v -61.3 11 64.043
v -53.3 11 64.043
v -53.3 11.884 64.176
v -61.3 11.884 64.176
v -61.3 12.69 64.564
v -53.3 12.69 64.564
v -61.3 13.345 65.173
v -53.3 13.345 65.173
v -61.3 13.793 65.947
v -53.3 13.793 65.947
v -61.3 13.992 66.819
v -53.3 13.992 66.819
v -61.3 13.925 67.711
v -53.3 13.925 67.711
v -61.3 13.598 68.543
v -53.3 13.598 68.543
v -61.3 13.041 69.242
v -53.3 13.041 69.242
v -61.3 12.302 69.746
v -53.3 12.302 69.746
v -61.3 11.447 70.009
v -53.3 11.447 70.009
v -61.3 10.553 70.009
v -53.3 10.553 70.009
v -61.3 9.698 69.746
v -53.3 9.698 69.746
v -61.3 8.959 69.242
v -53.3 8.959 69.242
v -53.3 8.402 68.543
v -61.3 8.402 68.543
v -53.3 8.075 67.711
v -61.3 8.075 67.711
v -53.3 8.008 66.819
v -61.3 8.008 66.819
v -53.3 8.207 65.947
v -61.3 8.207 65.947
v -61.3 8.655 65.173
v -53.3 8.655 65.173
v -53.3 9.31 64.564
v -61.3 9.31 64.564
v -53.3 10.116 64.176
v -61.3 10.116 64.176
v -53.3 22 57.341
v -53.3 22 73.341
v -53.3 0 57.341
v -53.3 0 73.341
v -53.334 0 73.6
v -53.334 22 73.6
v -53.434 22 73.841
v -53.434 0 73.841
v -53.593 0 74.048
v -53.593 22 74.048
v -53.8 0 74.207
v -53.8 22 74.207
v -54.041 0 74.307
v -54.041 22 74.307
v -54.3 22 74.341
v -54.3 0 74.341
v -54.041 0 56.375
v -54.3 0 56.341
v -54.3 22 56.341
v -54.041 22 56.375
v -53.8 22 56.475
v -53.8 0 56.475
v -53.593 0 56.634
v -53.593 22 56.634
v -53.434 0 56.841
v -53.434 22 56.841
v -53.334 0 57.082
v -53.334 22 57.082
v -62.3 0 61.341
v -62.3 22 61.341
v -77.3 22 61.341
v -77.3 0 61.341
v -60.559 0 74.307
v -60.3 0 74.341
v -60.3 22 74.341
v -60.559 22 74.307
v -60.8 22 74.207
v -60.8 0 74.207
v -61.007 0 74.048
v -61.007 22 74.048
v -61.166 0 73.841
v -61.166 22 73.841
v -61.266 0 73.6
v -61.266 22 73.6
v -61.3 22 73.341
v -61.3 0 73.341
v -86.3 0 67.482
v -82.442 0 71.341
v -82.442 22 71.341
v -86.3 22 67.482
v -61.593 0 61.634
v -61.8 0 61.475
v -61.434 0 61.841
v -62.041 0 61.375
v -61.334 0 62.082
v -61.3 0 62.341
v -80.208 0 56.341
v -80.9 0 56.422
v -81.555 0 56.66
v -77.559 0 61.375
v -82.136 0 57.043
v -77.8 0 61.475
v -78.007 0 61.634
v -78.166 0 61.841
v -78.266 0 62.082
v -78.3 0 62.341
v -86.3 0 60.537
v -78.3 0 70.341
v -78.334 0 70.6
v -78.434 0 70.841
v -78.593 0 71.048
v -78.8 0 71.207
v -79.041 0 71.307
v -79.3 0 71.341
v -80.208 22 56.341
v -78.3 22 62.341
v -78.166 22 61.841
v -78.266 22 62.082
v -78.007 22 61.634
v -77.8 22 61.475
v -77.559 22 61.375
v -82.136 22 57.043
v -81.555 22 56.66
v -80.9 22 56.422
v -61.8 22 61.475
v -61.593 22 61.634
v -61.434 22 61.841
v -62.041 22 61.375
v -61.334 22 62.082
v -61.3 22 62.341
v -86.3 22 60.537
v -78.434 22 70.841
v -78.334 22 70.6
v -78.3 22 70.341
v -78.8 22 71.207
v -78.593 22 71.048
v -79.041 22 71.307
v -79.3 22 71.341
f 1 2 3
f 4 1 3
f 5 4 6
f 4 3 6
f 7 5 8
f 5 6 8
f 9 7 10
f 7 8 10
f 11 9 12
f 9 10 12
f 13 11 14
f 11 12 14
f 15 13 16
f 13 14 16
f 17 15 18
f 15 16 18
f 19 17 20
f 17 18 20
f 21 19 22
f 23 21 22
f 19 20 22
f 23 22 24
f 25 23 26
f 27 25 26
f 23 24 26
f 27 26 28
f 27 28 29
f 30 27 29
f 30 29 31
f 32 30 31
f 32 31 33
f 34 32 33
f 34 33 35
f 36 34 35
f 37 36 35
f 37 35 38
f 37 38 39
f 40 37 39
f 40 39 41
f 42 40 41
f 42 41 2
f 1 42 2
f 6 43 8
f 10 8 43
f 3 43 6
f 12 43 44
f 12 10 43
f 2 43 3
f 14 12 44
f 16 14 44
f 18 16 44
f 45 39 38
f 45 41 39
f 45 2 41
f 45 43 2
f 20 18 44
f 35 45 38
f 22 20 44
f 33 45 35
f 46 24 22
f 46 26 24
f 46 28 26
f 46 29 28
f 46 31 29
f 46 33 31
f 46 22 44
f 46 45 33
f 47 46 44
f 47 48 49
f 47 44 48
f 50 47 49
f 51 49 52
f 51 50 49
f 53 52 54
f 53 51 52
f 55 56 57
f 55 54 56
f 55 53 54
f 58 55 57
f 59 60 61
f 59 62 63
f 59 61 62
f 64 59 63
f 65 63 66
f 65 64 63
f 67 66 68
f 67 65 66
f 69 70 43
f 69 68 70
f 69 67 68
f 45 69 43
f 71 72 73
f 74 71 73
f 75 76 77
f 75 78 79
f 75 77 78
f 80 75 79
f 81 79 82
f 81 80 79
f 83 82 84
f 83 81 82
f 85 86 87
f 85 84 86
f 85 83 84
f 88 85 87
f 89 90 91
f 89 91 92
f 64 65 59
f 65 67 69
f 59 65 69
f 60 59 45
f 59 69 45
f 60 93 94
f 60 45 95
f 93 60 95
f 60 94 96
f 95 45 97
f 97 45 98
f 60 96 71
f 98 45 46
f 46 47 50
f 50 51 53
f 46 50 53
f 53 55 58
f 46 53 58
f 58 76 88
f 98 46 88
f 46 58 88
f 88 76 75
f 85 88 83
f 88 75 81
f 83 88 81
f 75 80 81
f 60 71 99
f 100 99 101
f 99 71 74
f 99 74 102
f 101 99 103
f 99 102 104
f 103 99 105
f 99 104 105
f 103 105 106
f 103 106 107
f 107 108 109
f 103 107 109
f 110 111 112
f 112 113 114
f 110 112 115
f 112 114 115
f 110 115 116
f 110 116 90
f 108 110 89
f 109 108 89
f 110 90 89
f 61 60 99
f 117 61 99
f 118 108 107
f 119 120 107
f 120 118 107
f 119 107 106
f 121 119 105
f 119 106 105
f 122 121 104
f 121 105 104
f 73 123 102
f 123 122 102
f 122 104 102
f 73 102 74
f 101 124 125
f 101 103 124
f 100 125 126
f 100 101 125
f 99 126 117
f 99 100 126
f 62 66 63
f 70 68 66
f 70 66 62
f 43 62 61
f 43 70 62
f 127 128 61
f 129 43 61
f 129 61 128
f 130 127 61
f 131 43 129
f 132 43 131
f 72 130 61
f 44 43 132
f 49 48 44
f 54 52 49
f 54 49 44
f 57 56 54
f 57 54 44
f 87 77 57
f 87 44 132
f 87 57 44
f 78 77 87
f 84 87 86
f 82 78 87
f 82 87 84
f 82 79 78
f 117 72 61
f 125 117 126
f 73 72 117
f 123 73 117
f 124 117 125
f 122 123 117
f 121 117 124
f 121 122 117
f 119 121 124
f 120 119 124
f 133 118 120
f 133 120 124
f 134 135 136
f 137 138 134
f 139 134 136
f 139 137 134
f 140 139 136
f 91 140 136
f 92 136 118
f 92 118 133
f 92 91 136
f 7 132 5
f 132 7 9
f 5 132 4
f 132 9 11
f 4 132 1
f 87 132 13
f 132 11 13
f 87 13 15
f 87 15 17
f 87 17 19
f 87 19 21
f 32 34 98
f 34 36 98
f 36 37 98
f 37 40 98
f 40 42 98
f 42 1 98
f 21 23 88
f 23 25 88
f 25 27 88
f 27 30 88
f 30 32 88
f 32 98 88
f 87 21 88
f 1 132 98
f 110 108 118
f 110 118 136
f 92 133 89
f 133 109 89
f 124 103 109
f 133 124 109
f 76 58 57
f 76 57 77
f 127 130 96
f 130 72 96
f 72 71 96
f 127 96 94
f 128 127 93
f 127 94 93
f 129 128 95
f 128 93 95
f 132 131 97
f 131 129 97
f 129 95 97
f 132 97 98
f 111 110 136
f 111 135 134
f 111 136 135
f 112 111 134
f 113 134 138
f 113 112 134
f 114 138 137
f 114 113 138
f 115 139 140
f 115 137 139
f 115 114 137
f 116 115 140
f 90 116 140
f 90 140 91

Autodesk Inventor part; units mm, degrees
ref_plane "YZ Plane" through (0, 0, 0) normal (1, 0, 0) x (0, 1, 0)
ref_plane "XZ Plane" through (0, 0, 0) normal (0, 1, 0) x (-1, 0, 0)
ref_plane "XY Plane" through (0, 0, 0) normal (0, 0, 1) x (1, 0, 0)
sketch "スケッチ1" plane through (0, 0, 0) normal (0, 1, 0) x (-1, 0, 0)
  line L0 (-49.8489, 61.5411) -> (-49.8489, 83.4411)
  line L1 (-49.8489, 83.4411) -> (10.1511, 83.4411)
  line L2 (10.1511, 83.4411) -> (10.1511, 61.5411)
  line L3 (10.1511, 61.5411) -> (-8.8489, 61.5411)
  line L4 (-8.8489, 56.3412) -> (-8.8489, 74.3411)
  line L5 (-8.8489, 74.3411) -> (-15.9758, 74.3411)
  line L6 (-23.7218, 74.3411) -> (-30.8489, 74.3411)
  line L7 (-30.8489, 74.3411) -> (-30.8489, 56.3412)
  line L8 (-30.8489, 56.3411) -> (-8.8489, 56.3411)
  circle A0 centre (-19.8489, 67.3411) radius 8
  circle A1 centre (-19.8489, 67.3411) radius 7.5
  line L9 (-30.8489, 61.5411) -> (-49.8489, 61.5411)
  line L10 (-49.8489, 75.5411) -> (10.1511, 75.5411)
  line L11 (53.2984, 117.706) -> (53.2984, 177.706)
  line L12 (53.2984, 177.706) -> (143.2984, 177.706)
  line L13 (143.2984, 177.706) -> (143.2984, 117.706)
  line L14 (143.2984, 117.706) -> (53.2984, 117.706)
  circle A2 centre (83.9984, 122.706) radius 1.5
  circle A3 centre (83.9984, 147.706) radius 1.5
  circle A4 centre (93.9984, 147.706) radius 2.25
  circle A5 centre (83.9984, 172.706) radius 1.5
  circle A6 centre (108.9984, 172.706) radius 1.5
  circle A7 centre (133.9984, 172.706) radius 1.5
  circle A8 centre (133.9984, 147.706) radius 1.5
  circle A9 centre (123.9984, 147.706) radius 2.25
  circle A10 centre (108.9984, 147.706) radius 7.5
  circle A11 centre (108.9984, 122.706) radius 1.5
  circle A12 centre (133.9984, 122.706) radius 1.5
  line L15 (174.3262, 83.4411) -> (174.3262, 61.5411)
  line L16 (174.3262, 61.5411) -> (193.3262, 61.5411)
  line L17 (193.3262, 65.4411) -> (193.3262, 56.3412)
  line L18 (193.3262, 56.3411) -> (215.3262, 56.3411)
  line L19 (215.3262, 56.3412) -> (215.3262, 65.4411)
  line L20 (215.3262, 61.5411) -> (234.3263, 61.5411)
  line L21 (234.3263, 61.5411) -> (234.3263, 83.4411)
  line L22 (234.3263, 83.4411) -> (174.3262, 83.4411)
  line L23 (234.3263, 65.4411) -> (174.3262, 65.4411)
  line L24 (143.2984, 25.0403) -> (53.2984, 25.0403)
  line L25 (53.2984, 25.0403) -> (53.2984, -34.9597)
  line L26 (53.2984, -34.9597) -> (143.2984, -34.9597)
  line L27 (143.2984, -34.9597) -> (143.2984, 25.0403)
  line L28 (131.5644, 25.0403) -> (131.5644, -34.9597)
  circle A13 centre (108.9984, -29.9597) radius 1.5
  circle A14 centre (108.9984, -4.9597) radius 7.5
  circle A15 centre (123.9984, -4.9597) radius 2.25
  circle A16 centre (123.9984, -4.9597) radius 4
  circle A17 centre (108.9984, 20.0403) radius 1.5
  circle A18 centre (83.9984, 20.0403) radius 1.5
  line L29 (73.2984, 25.0403) -> (73.2984, 6.0403)
  line L30 (86.3001, -15.9597) -> (86.3001, 6.0403)
  line L31 (86.3001, 6.0403) -> (53.3001, 6.0403)
  line L32 (53.3001, 6.0403) -> (53.3001, -15.9597)
  line L33 (53.3001, -15.9597) -> (86.3001, -15.9597)
  line L34 (73.2984, -15.9597) -> (73.2984, -34.9597)
  line L35 (63.2984, -34.9597) -> (63.2984, -15.9597)
  line L36 (63.2984, 6.0403) -> (63.2984, 25.0403)
  circle A19 centre (83.9984, -29.9597) radius 1.5
  circle A20 centre (93.9984, -4.9597) radius 2.25
  circle A21 centre (93.9984, -4.9597) radius 4
  line L37 (-19.8489, 49.2711) -> (-19.8489, 87.2696)
  line L38 (-6.1616, 67.3411) -> (-35.9585, 67.3411)
  line L39 (83.9984, 23.5784) -> (83.9984, 16.5836)
  circle A22 centre (83.9984, 20.0403) radius 2
  line L40 (80.6576, 20.0403) -> (87.5893, 20.0403)
  line L41 (93.9984, 1.0394) -> (93.9984, -10.6526)
  line L42 (83.9984, -26.503) -> (83.9984, -33.4978)
  circle A23 centre (83.9984, -29.9597) radius 2
  line L43 (80.6576, -29.9597) -> (87.5893, -29.9597)
  line L44 (29.8273, -4.9597) -> (148.6488, -4.9597)
  line L45 (123.9984, -10.6526) -> (123.9984, 1.0394)
  line L46 (112.4368, 20.0403) -> (105.6741, 20.0403)
  circle A24 centre (108.9984, 20.0403) radius 2
  line L47 (108.9984, 32.4142) -> (108.9984, -41.5197)
  circle A25 centre (108.9984, -29.9597) radius 2
  line L48 (105.4074, -29.9597) -> (112.8092, -29.9597)
  circle A26 centre (108.9984, -4.9597) radius 8
  line L49 (108.9984, 111.8823) -> (108.9984, 183.8068)
  circle A27 centre (108.9984, 172.706) radius 2
  line L50 (105.6741, 172.706) -> (112.4368, 172.706)
  line L51 (130.4749, 172.706) -> (137.3391, 172.706)
  circle A28 centre (133.9984, 172.706) radius 2
  line L52 (133.9984, 169.2493) -> (133.9984, 176.2441)
  line L53 (123.9984, 153.3988) -> (123.9984, 141.7069)
  circle A29 centre (123.9984, 147.706) radius 4
  circle A30 centre (133.9984, 147.706) radius 2
  line L54 (133.9984, 151.0572) -> (133.9984, 144.2493)
  line L55 (148.6488, 147.706) -> (29.8273, 147.706)
  circle A31 centre (83.9984, 147.706) radius 2
  line L56 (83.9984, 151.0572) -> (83.9984, 144.2493)
  line L57 (93.9984, 141.7069) -> (93.9984, 153.3988)
  circle A32 centre (93.9984, 147.706) radius 4
  line L58 (83.9984, 169.2493) -> (83.9984, 176.2441)
  circle A33 centre (83.9984, 172.706) radius 2
  line L59 (80.6576, 172.706) -> (87.5893, 172.706)
  circle A34 centre (108.9984, 147.706) radius 8
  circle A35 centre (108.9984, 122.706) radius 2
  line L60 (105.4074, 122.706) -> (112.8092, 122.706)
  line L61 (130.8446, 122.706) -> (137.3391, 122.706)
  circle A36 centre (133.9984, 122.706) radius 2
  line L62 (133.9984, 126.1627) -> (133.9984, 119.1679)
  line L63 (87.5893, 122.706) -> (80.6576, 122.706)
  circle A37 centre (83.9984, 122.706) radius 2
  line L64 (83.9984, 126.1627) -> (83.9984, 119.1679)
  line L65 (204.3262, 87.2696) -> (204.3262, 49.2711)
  line L66 (176.3262, 70.0686) -> (232.3263, 70.0686)
  line L67 (82.1365, 4.0403) -> (82.1365, -13.9597)
  line L68 (51.8001, 144.706) -> (51.8001, 150.706)
  line L69 (53.2984, 150.706) -> (51.8001, 150.706)
  line L70 (53.2984, 144.706) -> (51.8001, 144.706)
  line L71 (33.8001, 155.206) -> (33.8001, 140.206)
  line L72 (33.8001, 140.206) -> (34.3001, 139.706)
  line L73 (34.3001, 139.706) -> (51.3001, 139.706)
  line L74 (51.3001, 139.706) -> (51.8001, 140.206)
  line L75 (51.8001, 140.206) -> (51.8001, 155.206)
  line L76 (51.8001, 155.206) -> (51.3001, 155.706)
  line L77 (51.3001, 155.706) -> (34.3001, 155.706)
  line L78 (34.3001, 155.706) -> (33.8001, 155.206)
  line L79 (34.3001, 155.706) -> (34.3001, 139.706)
  line L80 (51.3001, 139.706) -> (51.3001, 155.706)
  line L81 (51.8001, -7.9597) -> (51.8001, -1.9597)
  line L82 (53.3001, -1.9597) -> (51.8001, -1.9597)
  line L83 (53.3001, -7.9597) -> (51.8001, -7.9597)
  line L84 (33.8001, 2.5403) -> (33.8001, -12.4597)
  line L85 (33.8001, -12.4597) -> (34.3001, -12.9597)
  line L86 (34.3001, -12.9597) -> (51.3001, -12.9597)
  line L87 (51.3001, -12.9597) -> (51.8001, -12.4597)
  line L88 (51.8001, -12.4597) -> (51.8001, 2.5403)
  line L89 (51.8001, 2.5403) -> (51.3001, 3.0403)
  line L90 (51.3001, 3.0403) -> (34.3001, 3.0403)
  line L91 (34.3001, 3.0403) -> (33.8001, 2.5403)
  line L92 (34.3001, 3.0403) -> (34.3001, -12.9597)
  line L93 (51.3001, -12.9597) -> (51.3001, 3.0403)
  line L94 (28.0972, 67.3411) -> (83.3407, 67.3411)
  line L95 (82.8984, 75.4411) -> (90.6984, 75.4411)
  line L96 (127.3984, 75.4411) -> (133.1984, 75.4411)
  line L97 (134.7552, 70.5411) -> (131.5724, 67.3583)
  line L98 (82.4415, 71.3411) -> (86.3001, 67.4825)
  line L99 (78.3001, 69.4911) -> (75.8001, 69.4911)
  line L100 (78.3001, 65.1911) -> (75.8001, 65.1911)
  line L101 (75.8001, 64.8411) -> (75.8001, 69.8411)
  line L102 (75.3001, 70.3411) -> (73.1569, 70.3411)
  line L103 (75.3001, 64.3411) -> (73.1569, 64.3411)
  line L104 (75.8001, 69.8411) -> (73.1569, 69.8411)
  line L105 (75.8001, 64.8411) -> (73.1569, 64.8411)
  line L106 (51.8001, 64.3411) -> (51.8001, 70.3411)
  line L107 (53.3001, 70.3411) -> (51.8001, 70.3411)
  line L108 (53.3001, 64.3411) -> (51.8001, 64.3411)
  line L109 (33.8001, 74.8411) -> (33.8001, 59.8411)
  line L110 (33.8001, 59.8411) -> (34.3001, 59.3411)
  line L111 (34.3001, 59.3411) -> (51.3001, 59.3411)
  line L112 (51.3001, 59.3411) -> (51.8001, 59.8411)
  line L113 (51.8001, 59.8411) -> (51.8001, 74.8411)
  line L114 (51.8001, 74.8411) -> (51.3001, 75.3411)
  line L115 (51.3001, 75.3411) -> (34.3001, 75.3411)
  line L116 (34.3001, 75.3411) -> (33.8001, 74.8411)
  line L117 (34.3001, 75.3411) -> (34.3001, 59.3411)
  line L118 (51.3001, 59.3411) -> (51.3001, 75.3411)
  line L119 (54.3001, 74.3411) -> (60.3001, 74.3411)
  line L120 (54.3001, 56.3411) -> (80.2082, 56.3411)
  line L121 (53.3001, 57.3411) -> (53.3001, 73.3411)
  line L122 (86.3001, 60.5366) -> (86.3001, 67.4825)
  line L123 (61.3001, 62.3411) -> (61.3001, 73.3411)
  line L124 (62.3001, 61.3411) -> (77.3001, 61.3411)
  line L125 (78.3001, 62.3411) -> (78.3001, 70.3411)
  line L126 (79.3001, 71.3411) -> (82.4415, 71.3411)
  line L127 (82.1365, 57.0429) -> (86.3001, 60.5366)
  arc A38 (80.2082, 56.3411) -> (82.1365, 57.0429) centre (80.2082, 59.3411) ccw
  arc A39 (54.3001, 74.3411) -> (53.3001, 73.3411) centre (54.3001, 73.3411) ccw
  arc A40 (61.3001, 73.3411) -> (60.3001, 74.3411) centre (60.3001, 73.3411) ccw
  arc A41 (53.3001, 57.3411) -> (54.3001, 56.3411) centre (54.3001, 57.3411) ccw
  arc A42 (61.3001, 62.3411) -> (62.3001, 61.3411) centre (62.3001, 62.3411) ccw
  arc A43 (77.3001, 61.3411) -> (78.3001, 62.3411) centre (77.3001, 62.3411) ccw
  arc A44 (79.3001, 71.3411) -> (78.3001, 70.3411) centre (79.3001, 70.3411) ccw
  line L128 (63.1569, 70.3411) -> (61.3001, 70.3411)
  line L129 (63.1569, 69.8411) -> (61.3001, 69.8411)
  line L130 (63.1569, 64.8411) -> (61.3001, 64.8411)
  line L131 (63.1569, 64.3411) -> (61.3001, 64.3411)
  line L132 (75.3001, 70.3411) -> (75.8001, 69.8411)
  line L133 (75.3001, 64.3411) -> (75.8001, 64.8411)
  arc A45 (63.2984, 63.5411) -> (65.2984, 61.5411) centre (65.2984, 63.5411) ccw
  line L134 (65.2984, 61.5411) -> (71.2984, 61.5411)
  arc A46 (71.2984, 61.5411) -> (73.2984, 63.5411) centre (71.2984, 63.5411) ccw
  line L135 (73.2984, 63.5411) -> (73.2984, 75.0411)
  line L136 (135.2984, 75.8411) -> (135.2984, 70.7411)
  line L137 (143.2984, 72.6666) -> (143.2984, 83.4411)
  line L138 (143.2984, 83.4411) -> (53.2984, 83.4411)
  line L139 (53.2984, 83.4411) -> (53.2984, 76.5411)
  arc A47 (53.2984, 76.5411) -> (54.2984, 75.5411) centre (54.2984, 76.5411) ccw
  line L140 (54.2984, 75.5411) -> (62.2984, 75.5411)
  arc A48 (63.2984, 74.5411) -> (62.2984, 75.5411) centre (62.2984, 74.5411) ccw
  line L141 (63.2984, 74.5411) -> (63.2984, 63.5411)
  line L142 (74.2984, 76.0411) -> (82.2984, 76.0411)
  line L143 (133.7984, 76.0411) -> (133.1984, 75.4411)
  line L144 (127.3984, 75.4411) -> (126.7984, 76.0411)
  line L145 (90.6984, 75.4411) -> (91.2984, 76.0411)
  line L146 (82.8984, 75.4411) -> (82.2984, 76.0411)
  line L147 (91.2984, 76.0411) -> (126.7984, 76.0411)
  arc A49 (74.2984, 76.0411) -> (73.2984, 75.0411) centre (74.2984, 75.0411) ccw
  line L148 (133.7984, 76.0411) -> (135.0984, 76.0411)
  arc A50 (135.2984, 75.8411) -> (135.0984, 76.0411) centre (135.0984, 75.8411) ccw
  line L149 (135.0984, 70.5411) -> (134.7552, 70.5411)
  arc A51 (135.0984, 70.5411) -> (135.2984, 70.7411) centre (135.0984, 70.7411) ccw
  arc A52 (131.5724, 67.3583) -> (134.1894, 65.6755) centre (133.3144, 67.1911) ccw
  line L150 (134.1894, 65.6755) -> (141.7984, 70.0686)
  arc A53 (141.7984, 70.0686) -> (143.2984, 72.6666) centre (140.2984, 72.6666) ccw
  line L151 (124.9984, 127.8911) -> (124.9984, 123.5209)
  line L152 (127.1835, 125.706) -> (122.8133, 125.706)
  circle A54 centre (124.9984, 125.706) radius 1
  circle A55 centre (124.9984, 125.706) radius 1.5
  line L153 (124.9984, 167.5209) -> (124.9984, 171.8911)
  line L154 (127.1835, 169.706) -> (122.8133, 169.706)
  circle A56 centre (124.9984, 169.706) radius 1
  circle A57 centre (124.9984, 169.706) radius 1.5
  line L155 (58.9984, 127.8911) -> (58.9984, 123.5209)
  line L156 (61.1835, 125.706) -> (56.8133, 125.706)
  circle A58 centre (58.9984, 125.706) radius 1
  circle A59 centre (58.9984, 125.706) radius 1.5
  line L157 (58.9984, 167.5209) -> (58.9984, 171.8911)
  line L158 (61.1835, 169.706) -> (56.8133, 169.706)
  circle A60 centre (58.9984, 169.706) radius 1
  circle A61 centre (58.9984, 169.706) radius 1.5
  line L159 (34.3001, 154.706) -> (49.1751, 154.706)
  line L160 (34.3001, 153.706) -> (47.0501, 153.706)
  line L161 (34.3001, 152.706) -> (44.9251, 152.706)
  line L162 (34.3001, 151.706) -> (42.8001, 151.706)
  line L163 (34.3001, 150.706) -> (40.6751, 150.706)
  line L164 (34.3001, 149.706) -> (38.5501, 149.706)
  line L165 (34.3001, 148.706) -> (36.4251, 148.706)
  line L166 (34.3001, 2.0403) -> (49.1751, 2.0403)
  line L167 (34.3001, 1.0403) -> (47.0501, 1.0403)
  line L168 (34.3001, 0.0403) -> (44.9251, 0.0403)
  line L169 (34.3001, -0.9597) -> (42.8001, -0.9597)
  line L170 (34.3001, -1.9597) -> (40.6751, -1.9597)
  line L171 (34.3001, -2.9597) -> (38.5501, -2.9597)
  line L172 (34.3001, -3.9597) -> (36.4251, -3.9597)
  line L173 (108.9984, 51.8579) -> (108.9984, 88.7279)
  line L174 (34.3001, 74.3411) -> (49.1751, 74.3411)
  line L175 (34.3001, 73.3411) -> (47.0501, 73.3411)
  line L176 (34.3001, 72.3411) -> (44.9251, 72.3411)
  line L177 (34.3001, 71.3411) -> (42.8001, 71.3411)
  line L178 (34.3001, 70.3411) -> (40.6751, 70.3411)
  line L179 (34.3001, 69.3411) -> (38.5501, 69.3411)
  line L180 (34.3001, 68.3411) -> (36.4251, 68.3411)
  point P0 (0, 0)
  point P1 (209.8216, -24.5126)
  point P2 (209.8216, -11.7034)
  point P3 (82.1365, 57.0429)
extrude "押し出し1" add sketch "スケッチ1" along normal blind 22 contours L121 A39 L119 A40 L123 L94 | L94 L123 A42 L124 A43 L125 A44 L126 L98 L122 L127 A38 L120 A41 L121
sketch "スケッチ4" plane through (-53.3001, 0, 73.3411) normal (1, 0, 0) x (0, 0, -1)
  line L0 (16.2981, 0) -> (16.2981, 22) projected
  line L1 (16.2981, 11) -> (6.2981, 11) construction
  circle A0 centre (6.2981, 11) radius 3
  point P0 (73.3411, 0)
  dimension "d5" = 10
  dimension "d6" = 6
extrude "押し出し2" cut sketch "スケッチ4" against normal blind 10
thread "ねじ1" size "M6x1" class "6H" standard "ANSI Metric M Profile" full length
properties part number "carrier_holder" material "UHMW、黒"
